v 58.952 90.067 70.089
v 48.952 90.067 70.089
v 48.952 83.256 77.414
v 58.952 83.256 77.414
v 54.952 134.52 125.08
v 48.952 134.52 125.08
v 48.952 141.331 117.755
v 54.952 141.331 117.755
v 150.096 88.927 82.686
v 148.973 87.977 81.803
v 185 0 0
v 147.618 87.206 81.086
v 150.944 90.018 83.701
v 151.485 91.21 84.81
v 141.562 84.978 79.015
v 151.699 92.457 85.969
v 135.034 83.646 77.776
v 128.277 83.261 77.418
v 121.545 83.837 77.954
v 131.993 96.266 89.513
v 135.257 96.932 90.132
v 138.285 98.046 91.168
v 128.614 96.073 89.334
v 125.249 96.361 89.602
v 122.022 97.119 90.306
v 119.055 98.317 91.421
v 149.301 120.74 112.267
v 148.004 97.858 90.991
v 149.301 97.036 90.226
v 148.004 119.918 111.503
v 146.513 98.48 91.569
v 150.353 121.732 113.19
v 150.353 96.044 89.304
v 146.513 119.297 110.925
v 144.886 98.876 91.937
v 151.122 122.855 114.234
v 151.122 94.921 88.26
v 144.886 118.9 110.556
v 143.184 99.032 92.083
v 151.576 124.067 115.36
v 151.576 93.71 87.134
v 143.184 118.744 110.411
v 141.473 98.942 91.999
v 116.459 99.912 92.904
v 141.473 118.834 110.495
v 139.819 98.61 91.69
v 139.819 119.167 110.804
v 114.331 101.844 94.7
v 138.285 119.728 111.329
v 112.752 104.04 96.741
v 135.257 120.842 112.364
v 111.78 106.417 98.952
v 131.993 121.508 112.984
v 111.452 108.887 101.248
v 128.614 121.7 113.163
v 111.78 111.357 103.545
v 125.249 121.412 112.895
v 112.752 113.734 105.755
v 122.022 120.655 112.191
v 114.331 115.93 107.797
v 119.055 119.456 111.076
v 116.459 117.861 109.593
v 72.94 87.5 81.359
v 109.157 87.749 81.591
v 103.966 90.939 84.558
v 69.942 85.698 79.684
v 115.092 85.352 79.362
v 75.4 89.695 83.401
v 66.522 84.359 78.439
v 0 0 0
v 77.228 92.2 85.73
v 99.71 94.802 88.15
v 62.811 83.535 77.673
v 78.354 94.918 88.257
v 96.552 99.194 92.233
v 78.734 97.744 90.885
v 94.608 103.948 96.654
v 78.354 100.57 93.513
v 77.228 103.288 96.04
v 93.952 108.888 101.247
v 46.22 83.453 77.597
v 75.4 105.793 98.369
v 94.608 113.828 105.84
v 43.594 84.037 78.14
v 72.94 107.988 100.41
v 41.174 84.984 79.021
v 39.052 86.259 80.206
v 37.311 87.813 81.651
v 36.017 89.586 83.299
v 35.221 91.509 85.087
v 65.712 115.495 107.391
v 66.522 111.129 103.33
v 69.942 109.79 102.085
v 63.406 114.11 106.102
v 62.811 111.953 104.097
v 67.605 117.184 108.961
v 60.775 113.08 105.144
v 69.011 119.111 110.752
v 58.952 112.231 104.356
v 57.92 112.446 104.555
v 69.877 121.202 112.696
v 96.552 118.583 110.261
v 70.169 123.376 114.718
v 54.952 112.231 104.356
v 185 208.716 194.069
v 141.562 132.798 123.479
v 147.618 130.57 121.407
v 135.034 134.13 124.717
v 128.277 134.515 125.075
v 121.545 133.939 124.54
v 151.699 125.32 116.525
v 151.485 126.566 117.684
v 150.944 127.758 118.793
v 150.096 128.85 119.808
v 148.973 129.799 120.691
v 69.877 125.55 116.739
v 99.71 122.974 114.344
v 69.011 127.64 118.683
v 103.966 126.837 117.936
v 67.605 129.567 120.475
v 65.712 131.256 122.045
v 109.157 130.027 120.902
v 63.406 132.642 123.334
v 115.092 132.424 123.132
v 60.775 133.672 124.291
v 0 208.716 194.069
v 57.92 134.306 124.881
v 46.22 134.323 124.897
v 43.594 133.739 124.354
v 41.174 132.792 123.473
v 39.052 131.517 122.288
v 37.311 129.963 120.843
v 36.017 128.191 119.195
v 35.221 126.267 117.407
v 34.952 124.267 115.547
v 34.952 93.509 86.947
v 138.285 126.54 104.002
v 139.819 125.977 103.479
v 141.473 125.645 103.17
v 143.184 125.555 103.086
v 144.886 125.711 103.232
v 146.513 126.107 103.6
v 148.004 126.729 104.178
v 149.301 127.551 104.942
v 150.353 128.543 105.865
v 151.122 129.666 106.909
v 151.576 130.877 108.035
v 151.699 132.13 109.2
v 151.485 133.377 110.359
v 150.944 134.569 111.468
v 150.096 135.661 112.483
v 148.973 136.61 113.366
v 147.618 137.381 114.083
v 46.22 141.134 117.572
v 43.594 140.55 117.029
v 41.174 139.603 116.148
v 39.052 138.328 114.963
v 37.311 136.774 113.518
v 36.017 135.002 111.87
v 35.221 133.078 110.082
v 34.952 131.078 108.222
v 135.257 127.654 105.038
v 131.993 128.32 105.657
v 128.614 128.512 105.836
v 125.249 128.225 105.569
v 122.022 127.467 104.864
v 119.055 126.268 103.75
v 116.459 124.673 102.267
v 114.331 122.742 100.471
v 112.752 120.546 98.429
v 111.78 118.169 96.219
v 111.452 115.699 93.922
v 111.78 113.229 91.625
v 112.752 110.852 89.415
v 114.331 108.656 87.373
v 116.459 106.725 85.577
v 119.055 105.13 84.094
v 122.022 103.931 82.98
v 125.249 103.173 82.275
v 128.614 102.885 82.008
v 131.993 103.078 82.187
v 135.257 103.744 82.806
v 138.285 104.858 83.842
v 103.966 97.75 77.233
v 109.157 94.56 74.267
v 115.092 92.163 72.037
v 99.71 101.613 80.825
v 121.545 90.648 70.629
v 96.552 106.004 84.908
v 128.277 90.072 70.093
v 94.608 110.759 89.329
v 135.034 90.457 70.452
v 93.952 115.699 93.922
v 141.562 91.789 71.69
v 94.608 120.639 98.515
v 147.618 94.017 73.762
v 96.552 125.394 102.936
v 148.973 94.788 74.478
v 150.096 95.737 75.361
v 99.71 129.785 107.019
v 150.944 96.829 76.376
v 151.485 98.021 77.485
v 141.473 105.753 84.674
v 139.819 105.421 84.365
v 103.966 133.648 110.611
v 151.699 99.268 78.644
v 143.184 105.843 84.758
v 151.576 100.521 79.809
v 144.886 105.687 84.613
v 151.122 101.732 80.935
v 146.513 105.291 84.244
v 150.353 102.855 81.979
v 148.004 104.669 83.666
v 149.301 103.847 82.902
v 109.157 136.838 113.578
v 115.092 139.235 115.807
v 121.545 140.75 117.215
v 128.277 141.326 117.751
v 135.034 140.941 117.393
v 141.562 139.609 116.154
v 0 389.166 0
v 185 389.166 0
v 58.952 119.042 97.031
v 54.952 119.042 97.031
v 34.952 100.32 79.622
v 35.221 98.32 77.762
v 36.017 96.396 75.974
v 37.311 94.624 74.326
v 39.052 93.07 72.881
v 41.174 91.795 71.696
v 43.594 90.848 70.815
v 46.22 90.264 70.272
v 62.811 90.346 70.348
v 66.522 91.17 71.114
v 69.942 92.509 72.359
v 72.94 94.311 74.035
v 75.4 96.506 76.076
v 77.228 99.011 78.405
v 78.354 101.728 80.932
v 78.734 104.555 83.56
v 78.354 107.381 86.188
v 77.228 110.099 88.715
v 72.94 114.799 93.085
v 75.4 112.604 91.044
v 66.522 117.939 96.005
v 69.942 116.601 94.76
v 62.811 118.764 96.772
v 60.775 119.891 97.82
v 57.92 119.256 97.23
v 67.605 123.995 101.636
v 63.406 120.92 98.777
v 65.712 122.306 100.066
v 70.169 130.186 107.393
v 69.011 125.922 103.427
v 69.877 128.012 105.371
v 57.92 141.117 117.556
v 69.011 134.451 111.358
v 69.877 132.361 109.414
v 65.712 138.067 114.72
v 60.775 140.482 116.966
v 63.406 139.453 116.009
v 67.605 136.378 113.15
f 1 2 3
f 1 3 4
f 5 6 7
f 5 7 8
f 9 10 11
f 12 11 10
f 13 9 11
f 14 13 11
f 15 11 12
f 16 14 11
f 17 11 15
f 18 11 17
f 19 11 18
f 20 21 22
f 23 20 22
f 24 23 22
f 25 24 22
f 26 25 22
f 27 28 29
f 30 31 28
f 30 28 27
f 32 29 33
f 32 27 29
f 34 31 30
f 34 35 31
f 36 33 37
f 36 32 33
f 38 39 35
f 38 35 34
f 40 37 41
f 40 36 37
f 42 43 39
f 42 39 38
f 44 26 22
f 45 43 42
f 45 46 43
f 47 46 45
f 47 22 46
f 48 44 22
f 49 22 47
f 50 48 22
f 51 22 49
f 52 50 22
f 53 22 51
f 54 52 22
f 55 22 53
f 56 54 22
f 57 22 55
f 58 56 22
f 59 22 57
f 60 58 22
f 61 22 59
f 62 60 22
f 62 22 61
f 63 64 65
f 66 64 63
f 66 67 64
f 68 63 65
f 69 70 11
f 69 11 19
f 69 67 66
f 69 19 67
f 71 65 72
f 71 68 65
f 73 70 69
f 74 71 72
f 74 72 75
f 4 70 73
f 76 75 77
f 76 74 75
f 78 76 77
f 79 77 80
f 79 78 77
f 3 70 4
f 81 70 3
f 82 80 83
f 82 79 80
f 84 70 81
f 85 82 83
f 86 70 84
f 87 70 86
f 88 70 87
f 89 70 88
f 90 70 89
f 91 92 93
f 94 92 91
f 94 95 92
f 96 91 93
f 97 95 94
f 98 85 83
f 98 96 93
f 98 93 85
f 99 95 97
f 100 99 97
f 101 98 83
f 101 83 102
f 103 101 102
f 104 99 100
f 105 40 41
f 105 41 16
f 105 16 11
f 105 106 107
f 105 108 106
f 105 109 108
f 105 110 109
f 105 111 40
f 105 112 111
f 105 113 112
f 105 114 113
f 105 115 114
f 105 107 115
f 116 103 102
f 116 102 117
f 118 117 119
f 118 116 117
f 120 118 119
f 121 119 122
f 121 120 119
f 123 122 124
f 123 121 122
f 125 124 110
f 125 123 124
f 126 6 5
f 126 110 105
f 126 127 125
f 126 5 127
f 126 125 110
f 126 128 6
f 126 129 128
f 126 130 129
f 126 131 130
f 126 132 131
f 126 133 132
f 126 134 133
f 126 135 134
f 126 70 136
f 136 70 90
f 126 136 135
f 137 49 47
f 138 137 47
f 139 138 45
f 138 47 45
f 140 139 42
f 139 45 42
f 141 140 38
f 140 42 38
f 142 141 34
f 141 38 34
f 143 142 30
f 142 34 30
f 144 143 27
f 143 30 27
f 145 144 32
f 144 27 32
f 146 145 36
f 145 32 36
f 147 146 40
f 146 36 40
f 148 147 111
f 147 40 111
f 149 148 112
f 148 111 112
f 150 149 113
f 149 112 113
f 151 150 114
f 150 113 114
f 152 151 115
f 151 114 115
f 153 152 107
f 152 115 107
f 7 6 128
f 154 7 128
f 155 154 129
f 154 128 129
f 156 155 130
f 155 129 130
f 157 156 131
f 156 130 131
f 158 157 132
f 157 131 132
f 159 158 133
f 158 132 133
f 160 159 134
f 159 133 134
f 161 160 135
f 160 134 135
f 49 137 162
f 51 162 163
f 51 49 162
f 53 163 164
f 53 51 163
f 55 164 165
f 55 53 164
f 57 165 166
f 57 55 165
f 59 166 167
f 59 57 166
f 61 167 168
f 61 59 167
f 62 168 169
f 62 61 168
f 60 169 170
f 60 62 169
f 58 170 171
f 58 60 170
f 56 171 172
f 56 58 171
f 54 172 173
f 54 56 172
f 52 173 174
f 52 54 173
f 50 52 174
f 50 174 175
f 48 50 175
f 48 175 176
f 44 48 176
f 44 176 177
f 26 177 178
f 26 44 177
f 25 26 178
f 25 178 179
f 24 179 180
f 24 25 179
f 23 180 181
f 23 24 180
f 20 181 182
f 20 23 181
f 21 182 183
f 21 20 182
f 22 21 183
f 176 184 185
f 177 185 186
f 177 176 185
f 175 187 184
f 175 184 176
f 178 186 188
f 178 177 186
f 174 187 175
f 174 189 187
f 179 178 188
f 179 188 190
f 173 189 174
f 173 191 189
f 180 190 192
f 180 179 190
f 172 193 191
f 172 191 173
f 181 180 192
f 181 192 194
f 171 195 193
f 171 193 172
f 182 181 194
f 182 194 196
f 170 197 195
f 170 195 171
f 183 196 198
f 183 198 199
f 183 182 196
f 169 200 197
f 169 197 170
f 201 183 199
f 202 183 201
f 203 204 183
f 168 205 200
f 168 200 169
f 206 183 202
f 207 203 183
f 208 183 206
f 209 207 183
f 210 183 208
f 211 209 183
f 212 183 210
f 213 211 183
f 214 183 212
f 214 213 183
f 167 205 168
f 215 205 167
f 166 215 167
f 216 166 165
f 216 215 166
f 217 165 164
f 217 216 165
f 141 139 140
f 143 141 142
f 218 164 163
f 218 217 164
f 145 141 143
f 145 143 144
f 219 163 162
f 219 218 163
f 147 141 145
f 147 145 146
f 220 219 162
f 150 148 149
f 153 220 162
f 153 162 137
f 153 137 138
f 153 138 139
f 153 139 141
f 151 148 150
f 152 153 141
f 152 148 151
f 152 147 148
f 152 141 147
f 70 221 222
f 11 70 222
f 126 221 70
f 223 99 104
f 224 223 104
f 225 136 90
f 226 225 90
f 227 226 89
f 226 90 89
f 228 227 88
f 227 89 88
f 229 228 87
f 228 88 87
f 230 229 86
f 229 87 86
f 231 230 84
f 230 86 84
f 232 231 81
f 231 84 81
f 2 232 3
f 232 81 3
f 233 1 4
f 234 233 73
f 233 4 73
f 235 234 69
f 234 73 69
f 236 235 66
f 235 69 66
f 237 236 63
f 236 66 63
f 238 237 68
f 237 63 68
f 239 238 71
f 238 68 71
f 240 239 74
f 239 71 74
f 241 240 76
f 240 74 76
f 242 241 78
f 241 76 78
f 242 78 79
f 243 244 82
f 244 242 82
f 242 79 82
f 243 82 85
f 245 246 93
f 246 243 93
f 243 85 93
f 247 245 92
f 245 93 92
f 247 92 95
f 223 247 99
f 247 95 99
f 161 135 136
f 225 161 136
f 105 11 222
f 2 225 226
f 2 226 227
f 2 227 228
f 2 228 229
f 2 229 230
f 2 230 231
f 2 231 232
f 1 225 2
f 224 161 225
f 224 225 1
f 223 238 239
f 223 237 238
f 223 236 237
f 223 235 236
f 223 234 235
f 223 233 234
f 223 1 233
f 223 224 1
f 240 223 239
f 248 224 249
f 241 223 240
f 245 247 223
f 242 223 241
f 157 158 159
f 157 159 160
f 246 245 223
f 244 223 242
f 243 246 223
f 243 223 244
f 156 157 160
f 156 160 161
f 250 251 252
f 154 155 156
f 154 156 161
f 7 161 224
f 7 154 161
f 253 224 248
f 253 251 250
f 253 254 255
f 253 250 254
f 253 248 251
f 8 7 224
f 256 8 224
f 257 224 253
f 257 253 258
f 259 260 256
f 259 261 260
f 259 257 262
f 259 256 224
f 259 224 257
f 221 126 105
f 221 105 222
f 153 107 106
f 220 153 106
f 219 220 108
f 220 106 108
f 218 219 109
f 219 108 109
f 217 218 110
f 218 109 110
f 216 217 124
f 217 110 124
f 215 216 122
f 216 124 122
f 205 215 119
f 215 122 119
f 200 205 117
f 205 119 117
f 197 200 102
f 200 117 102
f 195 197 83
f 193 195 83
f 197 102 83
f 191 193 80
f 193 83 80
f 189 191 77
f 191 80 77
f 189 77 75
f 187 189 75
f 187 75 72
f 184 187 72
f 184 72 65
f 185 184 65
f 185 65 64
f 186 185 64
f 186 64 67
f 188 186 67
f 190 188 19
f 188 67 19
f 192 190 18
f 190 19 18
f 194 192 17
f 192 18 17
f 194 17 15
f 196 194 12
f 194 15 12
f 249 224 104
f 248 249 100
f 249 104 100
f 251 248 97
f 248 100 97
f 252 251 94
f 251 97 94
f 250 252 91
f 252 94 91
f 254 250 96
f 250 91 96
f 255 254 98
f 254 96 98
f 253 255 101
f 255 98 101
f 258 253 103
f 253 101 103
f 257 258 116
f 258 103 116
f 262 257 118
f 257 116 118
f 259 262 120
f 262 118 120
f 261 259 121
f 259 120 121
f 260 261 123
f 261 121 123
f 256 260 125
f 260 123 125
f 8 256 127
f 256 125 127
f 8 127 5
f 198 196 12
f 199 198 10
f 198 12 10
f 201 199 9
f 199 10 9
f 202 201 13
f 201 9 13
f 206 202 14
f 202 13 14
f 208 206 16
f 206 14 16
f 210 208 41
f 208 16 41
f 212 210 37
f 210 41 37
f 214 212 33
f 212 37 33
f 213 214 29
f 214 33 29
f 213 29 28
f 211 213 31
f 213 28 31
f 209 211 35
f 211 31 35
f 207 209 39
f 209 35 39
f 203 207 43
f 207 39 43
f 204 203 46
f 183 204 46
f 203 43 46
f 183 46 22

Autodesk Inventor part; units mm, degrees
ref_plane "YZ Plane" through (0, 0, 0) normal (1, 0, 0) x (0, 1, 0)
ref_plane "XZ Plane" through (0, 0, 0) normal (0, 1, 0) x (-1, 0, 0)
ref_plane "XY Plane" through (0, 0, 0) normal (0, 0, 1) x (1, 0, 0)
sketch "Sketch1" plane through (0, 0, 0) normal (0, 0, 1) x (1, 0, 0)
  line L0 (0, 0) -> (185, 0)
  line L1 (185, 0) -> (185, 450)
  line L2 (185, 450) -> (0, 450)
  line L3 (0, 450) -> (0, 0)
  dimension "d0" = 185
  dimension "d1" = 450
extrude "Extrusion1" add sketch "Sketch1" along normal blind 400
sketch "Sketch2" plane through (0, 0, 0) normal (-1, 0, 0) x (0, 0, 1)
  line L0 (0, 0) -> (0, 450) projected
  line L1 (0, 0) -> (194.069, 208.7157)
  line L2 (194.069, 208.7157) -> (0, 389.1658)
  line L3 (0, 0) -> (0, 389.1658)
  line L4 (0, 450) -> (0, 0) projected
  line L5 (0, 0) -> (400, 0) projected
  line L6 (400, 450) -> (400, 0) projected
  line L7 (0, 450) -> (400, 450) projected
  dimension "d4" = 265
  dimension "d5" = 90
  dimension "d6" = 285
extrude "Extrusion2" cut sketch "Sketch2" against normal blind 400 contours L1 L2 L0 L7 L6 L5
sketch "Sketch3" plane through (0, 208.7157, 194.069) normal (0, -0.6809437, 0.7323357) x (1, 0, 0)
  line L0 (34.9517, -115.3139) -> (34.9517, -157.3139)
  line L1 (48.9517, -171.3139) -> (58.9517, -171.3139)
  line L2 (48.9517, -101.3139) -> (54.9517, -101.3139)
  circle A0 centre (54.9517, -116.5313) radius 15.2174
  circle A1 centre (58.9517, -151.5313) radius 19.7826
  line L3 (58.9517, -131.7487) -> (54.9517, -131.7487)
  arc A2 (48.9517, -101.3139) -> (34.9517, -115.3139) centre (48.9517, -115.3139) ccw
  arc A3 (34.9517, -157.3139) -> (48.9517, -171.3139) centre (48.9517, -157.3139) ccw
  circle A4 centre (128.9517, -136.3139) radius 35
  circle A5 centre (128.9517, -136.3139) radius 17.5
  circle A6 centre (142.9517, -114.1089) radius 8.75
  circle A7 centre (142.9517, -158.5189) radius 8.75
  point P0 (0, -285)
  point P1 (0, 0)
  point P2 (34.9517, -101.3139)
  point P3 (34.9517, -171.3139)
  point P4 (34.9517, -136.3139)
  point P5 (135.9261, 202.4385)
  point P6 (135.9261, 232.0451)
  point P7 (145.2595, 246.8485)
  point P8 (145.2595, 187.6351)
  point P9 (52.5928, 252.2418)
  point P10 (56.5928, 182.2418)
  point P11 (138.285, -151.1172)
  point P12 (138.285, -121.5105)
  point P13 (147.6184, -106.7072)
  point P14 (147.6184, -165.9206)
  point P15 (58.9517, -171.3139)
  dimension "d12" = 30.4348
  dimension "d13" = 39.5652
  dimension "d9" = 70
  dimension "d10" = 24
  dimension "d11" = 20
  dimension "d14" = 15.2174
  dimension "d15" = 19.7826
  dimension "d16" = 14
  dimension "d17" = 70
  dimension "d18" = 35
  dimension "d19" = 17.5
  dimension "d20" = 17.5
  dimension "d21" = 14
  dimension "d22" = 70
extrude "Extrusion3" cut sketch "Sketch3" against normal blind 10 contours A2 L2 A0 L3 A1 L1 A3 L0 | A0 | A1 | A6 A5 A7 A4 | A6 | A7 picked at (128.1694, -161.6024)
equation "\"d12\" = 0.434783 * d9"
equation "\"d13\" = d9 - d12"
equation "\"d10\" = 1.2 * d11"
equation "\"d11\" = 0.285714 * d9"
equation "\"d14\" = 0.5 * d12"
equation "\"d15\" = 0.5 * d13"
equation "\"d16\" = 0.2 * d9"
equation "\"d17\" = d9"
equation "\"d18\" = 0.5 * d17"
equation "\"d19\" = -0.5 * d18 + 0.5 * d17"
equation "\"d20\" = d19"
equation "\"d21\" = 0.2 * d17"
equation "\"d22\" = d9"
properties part number "Triangle_V3"
